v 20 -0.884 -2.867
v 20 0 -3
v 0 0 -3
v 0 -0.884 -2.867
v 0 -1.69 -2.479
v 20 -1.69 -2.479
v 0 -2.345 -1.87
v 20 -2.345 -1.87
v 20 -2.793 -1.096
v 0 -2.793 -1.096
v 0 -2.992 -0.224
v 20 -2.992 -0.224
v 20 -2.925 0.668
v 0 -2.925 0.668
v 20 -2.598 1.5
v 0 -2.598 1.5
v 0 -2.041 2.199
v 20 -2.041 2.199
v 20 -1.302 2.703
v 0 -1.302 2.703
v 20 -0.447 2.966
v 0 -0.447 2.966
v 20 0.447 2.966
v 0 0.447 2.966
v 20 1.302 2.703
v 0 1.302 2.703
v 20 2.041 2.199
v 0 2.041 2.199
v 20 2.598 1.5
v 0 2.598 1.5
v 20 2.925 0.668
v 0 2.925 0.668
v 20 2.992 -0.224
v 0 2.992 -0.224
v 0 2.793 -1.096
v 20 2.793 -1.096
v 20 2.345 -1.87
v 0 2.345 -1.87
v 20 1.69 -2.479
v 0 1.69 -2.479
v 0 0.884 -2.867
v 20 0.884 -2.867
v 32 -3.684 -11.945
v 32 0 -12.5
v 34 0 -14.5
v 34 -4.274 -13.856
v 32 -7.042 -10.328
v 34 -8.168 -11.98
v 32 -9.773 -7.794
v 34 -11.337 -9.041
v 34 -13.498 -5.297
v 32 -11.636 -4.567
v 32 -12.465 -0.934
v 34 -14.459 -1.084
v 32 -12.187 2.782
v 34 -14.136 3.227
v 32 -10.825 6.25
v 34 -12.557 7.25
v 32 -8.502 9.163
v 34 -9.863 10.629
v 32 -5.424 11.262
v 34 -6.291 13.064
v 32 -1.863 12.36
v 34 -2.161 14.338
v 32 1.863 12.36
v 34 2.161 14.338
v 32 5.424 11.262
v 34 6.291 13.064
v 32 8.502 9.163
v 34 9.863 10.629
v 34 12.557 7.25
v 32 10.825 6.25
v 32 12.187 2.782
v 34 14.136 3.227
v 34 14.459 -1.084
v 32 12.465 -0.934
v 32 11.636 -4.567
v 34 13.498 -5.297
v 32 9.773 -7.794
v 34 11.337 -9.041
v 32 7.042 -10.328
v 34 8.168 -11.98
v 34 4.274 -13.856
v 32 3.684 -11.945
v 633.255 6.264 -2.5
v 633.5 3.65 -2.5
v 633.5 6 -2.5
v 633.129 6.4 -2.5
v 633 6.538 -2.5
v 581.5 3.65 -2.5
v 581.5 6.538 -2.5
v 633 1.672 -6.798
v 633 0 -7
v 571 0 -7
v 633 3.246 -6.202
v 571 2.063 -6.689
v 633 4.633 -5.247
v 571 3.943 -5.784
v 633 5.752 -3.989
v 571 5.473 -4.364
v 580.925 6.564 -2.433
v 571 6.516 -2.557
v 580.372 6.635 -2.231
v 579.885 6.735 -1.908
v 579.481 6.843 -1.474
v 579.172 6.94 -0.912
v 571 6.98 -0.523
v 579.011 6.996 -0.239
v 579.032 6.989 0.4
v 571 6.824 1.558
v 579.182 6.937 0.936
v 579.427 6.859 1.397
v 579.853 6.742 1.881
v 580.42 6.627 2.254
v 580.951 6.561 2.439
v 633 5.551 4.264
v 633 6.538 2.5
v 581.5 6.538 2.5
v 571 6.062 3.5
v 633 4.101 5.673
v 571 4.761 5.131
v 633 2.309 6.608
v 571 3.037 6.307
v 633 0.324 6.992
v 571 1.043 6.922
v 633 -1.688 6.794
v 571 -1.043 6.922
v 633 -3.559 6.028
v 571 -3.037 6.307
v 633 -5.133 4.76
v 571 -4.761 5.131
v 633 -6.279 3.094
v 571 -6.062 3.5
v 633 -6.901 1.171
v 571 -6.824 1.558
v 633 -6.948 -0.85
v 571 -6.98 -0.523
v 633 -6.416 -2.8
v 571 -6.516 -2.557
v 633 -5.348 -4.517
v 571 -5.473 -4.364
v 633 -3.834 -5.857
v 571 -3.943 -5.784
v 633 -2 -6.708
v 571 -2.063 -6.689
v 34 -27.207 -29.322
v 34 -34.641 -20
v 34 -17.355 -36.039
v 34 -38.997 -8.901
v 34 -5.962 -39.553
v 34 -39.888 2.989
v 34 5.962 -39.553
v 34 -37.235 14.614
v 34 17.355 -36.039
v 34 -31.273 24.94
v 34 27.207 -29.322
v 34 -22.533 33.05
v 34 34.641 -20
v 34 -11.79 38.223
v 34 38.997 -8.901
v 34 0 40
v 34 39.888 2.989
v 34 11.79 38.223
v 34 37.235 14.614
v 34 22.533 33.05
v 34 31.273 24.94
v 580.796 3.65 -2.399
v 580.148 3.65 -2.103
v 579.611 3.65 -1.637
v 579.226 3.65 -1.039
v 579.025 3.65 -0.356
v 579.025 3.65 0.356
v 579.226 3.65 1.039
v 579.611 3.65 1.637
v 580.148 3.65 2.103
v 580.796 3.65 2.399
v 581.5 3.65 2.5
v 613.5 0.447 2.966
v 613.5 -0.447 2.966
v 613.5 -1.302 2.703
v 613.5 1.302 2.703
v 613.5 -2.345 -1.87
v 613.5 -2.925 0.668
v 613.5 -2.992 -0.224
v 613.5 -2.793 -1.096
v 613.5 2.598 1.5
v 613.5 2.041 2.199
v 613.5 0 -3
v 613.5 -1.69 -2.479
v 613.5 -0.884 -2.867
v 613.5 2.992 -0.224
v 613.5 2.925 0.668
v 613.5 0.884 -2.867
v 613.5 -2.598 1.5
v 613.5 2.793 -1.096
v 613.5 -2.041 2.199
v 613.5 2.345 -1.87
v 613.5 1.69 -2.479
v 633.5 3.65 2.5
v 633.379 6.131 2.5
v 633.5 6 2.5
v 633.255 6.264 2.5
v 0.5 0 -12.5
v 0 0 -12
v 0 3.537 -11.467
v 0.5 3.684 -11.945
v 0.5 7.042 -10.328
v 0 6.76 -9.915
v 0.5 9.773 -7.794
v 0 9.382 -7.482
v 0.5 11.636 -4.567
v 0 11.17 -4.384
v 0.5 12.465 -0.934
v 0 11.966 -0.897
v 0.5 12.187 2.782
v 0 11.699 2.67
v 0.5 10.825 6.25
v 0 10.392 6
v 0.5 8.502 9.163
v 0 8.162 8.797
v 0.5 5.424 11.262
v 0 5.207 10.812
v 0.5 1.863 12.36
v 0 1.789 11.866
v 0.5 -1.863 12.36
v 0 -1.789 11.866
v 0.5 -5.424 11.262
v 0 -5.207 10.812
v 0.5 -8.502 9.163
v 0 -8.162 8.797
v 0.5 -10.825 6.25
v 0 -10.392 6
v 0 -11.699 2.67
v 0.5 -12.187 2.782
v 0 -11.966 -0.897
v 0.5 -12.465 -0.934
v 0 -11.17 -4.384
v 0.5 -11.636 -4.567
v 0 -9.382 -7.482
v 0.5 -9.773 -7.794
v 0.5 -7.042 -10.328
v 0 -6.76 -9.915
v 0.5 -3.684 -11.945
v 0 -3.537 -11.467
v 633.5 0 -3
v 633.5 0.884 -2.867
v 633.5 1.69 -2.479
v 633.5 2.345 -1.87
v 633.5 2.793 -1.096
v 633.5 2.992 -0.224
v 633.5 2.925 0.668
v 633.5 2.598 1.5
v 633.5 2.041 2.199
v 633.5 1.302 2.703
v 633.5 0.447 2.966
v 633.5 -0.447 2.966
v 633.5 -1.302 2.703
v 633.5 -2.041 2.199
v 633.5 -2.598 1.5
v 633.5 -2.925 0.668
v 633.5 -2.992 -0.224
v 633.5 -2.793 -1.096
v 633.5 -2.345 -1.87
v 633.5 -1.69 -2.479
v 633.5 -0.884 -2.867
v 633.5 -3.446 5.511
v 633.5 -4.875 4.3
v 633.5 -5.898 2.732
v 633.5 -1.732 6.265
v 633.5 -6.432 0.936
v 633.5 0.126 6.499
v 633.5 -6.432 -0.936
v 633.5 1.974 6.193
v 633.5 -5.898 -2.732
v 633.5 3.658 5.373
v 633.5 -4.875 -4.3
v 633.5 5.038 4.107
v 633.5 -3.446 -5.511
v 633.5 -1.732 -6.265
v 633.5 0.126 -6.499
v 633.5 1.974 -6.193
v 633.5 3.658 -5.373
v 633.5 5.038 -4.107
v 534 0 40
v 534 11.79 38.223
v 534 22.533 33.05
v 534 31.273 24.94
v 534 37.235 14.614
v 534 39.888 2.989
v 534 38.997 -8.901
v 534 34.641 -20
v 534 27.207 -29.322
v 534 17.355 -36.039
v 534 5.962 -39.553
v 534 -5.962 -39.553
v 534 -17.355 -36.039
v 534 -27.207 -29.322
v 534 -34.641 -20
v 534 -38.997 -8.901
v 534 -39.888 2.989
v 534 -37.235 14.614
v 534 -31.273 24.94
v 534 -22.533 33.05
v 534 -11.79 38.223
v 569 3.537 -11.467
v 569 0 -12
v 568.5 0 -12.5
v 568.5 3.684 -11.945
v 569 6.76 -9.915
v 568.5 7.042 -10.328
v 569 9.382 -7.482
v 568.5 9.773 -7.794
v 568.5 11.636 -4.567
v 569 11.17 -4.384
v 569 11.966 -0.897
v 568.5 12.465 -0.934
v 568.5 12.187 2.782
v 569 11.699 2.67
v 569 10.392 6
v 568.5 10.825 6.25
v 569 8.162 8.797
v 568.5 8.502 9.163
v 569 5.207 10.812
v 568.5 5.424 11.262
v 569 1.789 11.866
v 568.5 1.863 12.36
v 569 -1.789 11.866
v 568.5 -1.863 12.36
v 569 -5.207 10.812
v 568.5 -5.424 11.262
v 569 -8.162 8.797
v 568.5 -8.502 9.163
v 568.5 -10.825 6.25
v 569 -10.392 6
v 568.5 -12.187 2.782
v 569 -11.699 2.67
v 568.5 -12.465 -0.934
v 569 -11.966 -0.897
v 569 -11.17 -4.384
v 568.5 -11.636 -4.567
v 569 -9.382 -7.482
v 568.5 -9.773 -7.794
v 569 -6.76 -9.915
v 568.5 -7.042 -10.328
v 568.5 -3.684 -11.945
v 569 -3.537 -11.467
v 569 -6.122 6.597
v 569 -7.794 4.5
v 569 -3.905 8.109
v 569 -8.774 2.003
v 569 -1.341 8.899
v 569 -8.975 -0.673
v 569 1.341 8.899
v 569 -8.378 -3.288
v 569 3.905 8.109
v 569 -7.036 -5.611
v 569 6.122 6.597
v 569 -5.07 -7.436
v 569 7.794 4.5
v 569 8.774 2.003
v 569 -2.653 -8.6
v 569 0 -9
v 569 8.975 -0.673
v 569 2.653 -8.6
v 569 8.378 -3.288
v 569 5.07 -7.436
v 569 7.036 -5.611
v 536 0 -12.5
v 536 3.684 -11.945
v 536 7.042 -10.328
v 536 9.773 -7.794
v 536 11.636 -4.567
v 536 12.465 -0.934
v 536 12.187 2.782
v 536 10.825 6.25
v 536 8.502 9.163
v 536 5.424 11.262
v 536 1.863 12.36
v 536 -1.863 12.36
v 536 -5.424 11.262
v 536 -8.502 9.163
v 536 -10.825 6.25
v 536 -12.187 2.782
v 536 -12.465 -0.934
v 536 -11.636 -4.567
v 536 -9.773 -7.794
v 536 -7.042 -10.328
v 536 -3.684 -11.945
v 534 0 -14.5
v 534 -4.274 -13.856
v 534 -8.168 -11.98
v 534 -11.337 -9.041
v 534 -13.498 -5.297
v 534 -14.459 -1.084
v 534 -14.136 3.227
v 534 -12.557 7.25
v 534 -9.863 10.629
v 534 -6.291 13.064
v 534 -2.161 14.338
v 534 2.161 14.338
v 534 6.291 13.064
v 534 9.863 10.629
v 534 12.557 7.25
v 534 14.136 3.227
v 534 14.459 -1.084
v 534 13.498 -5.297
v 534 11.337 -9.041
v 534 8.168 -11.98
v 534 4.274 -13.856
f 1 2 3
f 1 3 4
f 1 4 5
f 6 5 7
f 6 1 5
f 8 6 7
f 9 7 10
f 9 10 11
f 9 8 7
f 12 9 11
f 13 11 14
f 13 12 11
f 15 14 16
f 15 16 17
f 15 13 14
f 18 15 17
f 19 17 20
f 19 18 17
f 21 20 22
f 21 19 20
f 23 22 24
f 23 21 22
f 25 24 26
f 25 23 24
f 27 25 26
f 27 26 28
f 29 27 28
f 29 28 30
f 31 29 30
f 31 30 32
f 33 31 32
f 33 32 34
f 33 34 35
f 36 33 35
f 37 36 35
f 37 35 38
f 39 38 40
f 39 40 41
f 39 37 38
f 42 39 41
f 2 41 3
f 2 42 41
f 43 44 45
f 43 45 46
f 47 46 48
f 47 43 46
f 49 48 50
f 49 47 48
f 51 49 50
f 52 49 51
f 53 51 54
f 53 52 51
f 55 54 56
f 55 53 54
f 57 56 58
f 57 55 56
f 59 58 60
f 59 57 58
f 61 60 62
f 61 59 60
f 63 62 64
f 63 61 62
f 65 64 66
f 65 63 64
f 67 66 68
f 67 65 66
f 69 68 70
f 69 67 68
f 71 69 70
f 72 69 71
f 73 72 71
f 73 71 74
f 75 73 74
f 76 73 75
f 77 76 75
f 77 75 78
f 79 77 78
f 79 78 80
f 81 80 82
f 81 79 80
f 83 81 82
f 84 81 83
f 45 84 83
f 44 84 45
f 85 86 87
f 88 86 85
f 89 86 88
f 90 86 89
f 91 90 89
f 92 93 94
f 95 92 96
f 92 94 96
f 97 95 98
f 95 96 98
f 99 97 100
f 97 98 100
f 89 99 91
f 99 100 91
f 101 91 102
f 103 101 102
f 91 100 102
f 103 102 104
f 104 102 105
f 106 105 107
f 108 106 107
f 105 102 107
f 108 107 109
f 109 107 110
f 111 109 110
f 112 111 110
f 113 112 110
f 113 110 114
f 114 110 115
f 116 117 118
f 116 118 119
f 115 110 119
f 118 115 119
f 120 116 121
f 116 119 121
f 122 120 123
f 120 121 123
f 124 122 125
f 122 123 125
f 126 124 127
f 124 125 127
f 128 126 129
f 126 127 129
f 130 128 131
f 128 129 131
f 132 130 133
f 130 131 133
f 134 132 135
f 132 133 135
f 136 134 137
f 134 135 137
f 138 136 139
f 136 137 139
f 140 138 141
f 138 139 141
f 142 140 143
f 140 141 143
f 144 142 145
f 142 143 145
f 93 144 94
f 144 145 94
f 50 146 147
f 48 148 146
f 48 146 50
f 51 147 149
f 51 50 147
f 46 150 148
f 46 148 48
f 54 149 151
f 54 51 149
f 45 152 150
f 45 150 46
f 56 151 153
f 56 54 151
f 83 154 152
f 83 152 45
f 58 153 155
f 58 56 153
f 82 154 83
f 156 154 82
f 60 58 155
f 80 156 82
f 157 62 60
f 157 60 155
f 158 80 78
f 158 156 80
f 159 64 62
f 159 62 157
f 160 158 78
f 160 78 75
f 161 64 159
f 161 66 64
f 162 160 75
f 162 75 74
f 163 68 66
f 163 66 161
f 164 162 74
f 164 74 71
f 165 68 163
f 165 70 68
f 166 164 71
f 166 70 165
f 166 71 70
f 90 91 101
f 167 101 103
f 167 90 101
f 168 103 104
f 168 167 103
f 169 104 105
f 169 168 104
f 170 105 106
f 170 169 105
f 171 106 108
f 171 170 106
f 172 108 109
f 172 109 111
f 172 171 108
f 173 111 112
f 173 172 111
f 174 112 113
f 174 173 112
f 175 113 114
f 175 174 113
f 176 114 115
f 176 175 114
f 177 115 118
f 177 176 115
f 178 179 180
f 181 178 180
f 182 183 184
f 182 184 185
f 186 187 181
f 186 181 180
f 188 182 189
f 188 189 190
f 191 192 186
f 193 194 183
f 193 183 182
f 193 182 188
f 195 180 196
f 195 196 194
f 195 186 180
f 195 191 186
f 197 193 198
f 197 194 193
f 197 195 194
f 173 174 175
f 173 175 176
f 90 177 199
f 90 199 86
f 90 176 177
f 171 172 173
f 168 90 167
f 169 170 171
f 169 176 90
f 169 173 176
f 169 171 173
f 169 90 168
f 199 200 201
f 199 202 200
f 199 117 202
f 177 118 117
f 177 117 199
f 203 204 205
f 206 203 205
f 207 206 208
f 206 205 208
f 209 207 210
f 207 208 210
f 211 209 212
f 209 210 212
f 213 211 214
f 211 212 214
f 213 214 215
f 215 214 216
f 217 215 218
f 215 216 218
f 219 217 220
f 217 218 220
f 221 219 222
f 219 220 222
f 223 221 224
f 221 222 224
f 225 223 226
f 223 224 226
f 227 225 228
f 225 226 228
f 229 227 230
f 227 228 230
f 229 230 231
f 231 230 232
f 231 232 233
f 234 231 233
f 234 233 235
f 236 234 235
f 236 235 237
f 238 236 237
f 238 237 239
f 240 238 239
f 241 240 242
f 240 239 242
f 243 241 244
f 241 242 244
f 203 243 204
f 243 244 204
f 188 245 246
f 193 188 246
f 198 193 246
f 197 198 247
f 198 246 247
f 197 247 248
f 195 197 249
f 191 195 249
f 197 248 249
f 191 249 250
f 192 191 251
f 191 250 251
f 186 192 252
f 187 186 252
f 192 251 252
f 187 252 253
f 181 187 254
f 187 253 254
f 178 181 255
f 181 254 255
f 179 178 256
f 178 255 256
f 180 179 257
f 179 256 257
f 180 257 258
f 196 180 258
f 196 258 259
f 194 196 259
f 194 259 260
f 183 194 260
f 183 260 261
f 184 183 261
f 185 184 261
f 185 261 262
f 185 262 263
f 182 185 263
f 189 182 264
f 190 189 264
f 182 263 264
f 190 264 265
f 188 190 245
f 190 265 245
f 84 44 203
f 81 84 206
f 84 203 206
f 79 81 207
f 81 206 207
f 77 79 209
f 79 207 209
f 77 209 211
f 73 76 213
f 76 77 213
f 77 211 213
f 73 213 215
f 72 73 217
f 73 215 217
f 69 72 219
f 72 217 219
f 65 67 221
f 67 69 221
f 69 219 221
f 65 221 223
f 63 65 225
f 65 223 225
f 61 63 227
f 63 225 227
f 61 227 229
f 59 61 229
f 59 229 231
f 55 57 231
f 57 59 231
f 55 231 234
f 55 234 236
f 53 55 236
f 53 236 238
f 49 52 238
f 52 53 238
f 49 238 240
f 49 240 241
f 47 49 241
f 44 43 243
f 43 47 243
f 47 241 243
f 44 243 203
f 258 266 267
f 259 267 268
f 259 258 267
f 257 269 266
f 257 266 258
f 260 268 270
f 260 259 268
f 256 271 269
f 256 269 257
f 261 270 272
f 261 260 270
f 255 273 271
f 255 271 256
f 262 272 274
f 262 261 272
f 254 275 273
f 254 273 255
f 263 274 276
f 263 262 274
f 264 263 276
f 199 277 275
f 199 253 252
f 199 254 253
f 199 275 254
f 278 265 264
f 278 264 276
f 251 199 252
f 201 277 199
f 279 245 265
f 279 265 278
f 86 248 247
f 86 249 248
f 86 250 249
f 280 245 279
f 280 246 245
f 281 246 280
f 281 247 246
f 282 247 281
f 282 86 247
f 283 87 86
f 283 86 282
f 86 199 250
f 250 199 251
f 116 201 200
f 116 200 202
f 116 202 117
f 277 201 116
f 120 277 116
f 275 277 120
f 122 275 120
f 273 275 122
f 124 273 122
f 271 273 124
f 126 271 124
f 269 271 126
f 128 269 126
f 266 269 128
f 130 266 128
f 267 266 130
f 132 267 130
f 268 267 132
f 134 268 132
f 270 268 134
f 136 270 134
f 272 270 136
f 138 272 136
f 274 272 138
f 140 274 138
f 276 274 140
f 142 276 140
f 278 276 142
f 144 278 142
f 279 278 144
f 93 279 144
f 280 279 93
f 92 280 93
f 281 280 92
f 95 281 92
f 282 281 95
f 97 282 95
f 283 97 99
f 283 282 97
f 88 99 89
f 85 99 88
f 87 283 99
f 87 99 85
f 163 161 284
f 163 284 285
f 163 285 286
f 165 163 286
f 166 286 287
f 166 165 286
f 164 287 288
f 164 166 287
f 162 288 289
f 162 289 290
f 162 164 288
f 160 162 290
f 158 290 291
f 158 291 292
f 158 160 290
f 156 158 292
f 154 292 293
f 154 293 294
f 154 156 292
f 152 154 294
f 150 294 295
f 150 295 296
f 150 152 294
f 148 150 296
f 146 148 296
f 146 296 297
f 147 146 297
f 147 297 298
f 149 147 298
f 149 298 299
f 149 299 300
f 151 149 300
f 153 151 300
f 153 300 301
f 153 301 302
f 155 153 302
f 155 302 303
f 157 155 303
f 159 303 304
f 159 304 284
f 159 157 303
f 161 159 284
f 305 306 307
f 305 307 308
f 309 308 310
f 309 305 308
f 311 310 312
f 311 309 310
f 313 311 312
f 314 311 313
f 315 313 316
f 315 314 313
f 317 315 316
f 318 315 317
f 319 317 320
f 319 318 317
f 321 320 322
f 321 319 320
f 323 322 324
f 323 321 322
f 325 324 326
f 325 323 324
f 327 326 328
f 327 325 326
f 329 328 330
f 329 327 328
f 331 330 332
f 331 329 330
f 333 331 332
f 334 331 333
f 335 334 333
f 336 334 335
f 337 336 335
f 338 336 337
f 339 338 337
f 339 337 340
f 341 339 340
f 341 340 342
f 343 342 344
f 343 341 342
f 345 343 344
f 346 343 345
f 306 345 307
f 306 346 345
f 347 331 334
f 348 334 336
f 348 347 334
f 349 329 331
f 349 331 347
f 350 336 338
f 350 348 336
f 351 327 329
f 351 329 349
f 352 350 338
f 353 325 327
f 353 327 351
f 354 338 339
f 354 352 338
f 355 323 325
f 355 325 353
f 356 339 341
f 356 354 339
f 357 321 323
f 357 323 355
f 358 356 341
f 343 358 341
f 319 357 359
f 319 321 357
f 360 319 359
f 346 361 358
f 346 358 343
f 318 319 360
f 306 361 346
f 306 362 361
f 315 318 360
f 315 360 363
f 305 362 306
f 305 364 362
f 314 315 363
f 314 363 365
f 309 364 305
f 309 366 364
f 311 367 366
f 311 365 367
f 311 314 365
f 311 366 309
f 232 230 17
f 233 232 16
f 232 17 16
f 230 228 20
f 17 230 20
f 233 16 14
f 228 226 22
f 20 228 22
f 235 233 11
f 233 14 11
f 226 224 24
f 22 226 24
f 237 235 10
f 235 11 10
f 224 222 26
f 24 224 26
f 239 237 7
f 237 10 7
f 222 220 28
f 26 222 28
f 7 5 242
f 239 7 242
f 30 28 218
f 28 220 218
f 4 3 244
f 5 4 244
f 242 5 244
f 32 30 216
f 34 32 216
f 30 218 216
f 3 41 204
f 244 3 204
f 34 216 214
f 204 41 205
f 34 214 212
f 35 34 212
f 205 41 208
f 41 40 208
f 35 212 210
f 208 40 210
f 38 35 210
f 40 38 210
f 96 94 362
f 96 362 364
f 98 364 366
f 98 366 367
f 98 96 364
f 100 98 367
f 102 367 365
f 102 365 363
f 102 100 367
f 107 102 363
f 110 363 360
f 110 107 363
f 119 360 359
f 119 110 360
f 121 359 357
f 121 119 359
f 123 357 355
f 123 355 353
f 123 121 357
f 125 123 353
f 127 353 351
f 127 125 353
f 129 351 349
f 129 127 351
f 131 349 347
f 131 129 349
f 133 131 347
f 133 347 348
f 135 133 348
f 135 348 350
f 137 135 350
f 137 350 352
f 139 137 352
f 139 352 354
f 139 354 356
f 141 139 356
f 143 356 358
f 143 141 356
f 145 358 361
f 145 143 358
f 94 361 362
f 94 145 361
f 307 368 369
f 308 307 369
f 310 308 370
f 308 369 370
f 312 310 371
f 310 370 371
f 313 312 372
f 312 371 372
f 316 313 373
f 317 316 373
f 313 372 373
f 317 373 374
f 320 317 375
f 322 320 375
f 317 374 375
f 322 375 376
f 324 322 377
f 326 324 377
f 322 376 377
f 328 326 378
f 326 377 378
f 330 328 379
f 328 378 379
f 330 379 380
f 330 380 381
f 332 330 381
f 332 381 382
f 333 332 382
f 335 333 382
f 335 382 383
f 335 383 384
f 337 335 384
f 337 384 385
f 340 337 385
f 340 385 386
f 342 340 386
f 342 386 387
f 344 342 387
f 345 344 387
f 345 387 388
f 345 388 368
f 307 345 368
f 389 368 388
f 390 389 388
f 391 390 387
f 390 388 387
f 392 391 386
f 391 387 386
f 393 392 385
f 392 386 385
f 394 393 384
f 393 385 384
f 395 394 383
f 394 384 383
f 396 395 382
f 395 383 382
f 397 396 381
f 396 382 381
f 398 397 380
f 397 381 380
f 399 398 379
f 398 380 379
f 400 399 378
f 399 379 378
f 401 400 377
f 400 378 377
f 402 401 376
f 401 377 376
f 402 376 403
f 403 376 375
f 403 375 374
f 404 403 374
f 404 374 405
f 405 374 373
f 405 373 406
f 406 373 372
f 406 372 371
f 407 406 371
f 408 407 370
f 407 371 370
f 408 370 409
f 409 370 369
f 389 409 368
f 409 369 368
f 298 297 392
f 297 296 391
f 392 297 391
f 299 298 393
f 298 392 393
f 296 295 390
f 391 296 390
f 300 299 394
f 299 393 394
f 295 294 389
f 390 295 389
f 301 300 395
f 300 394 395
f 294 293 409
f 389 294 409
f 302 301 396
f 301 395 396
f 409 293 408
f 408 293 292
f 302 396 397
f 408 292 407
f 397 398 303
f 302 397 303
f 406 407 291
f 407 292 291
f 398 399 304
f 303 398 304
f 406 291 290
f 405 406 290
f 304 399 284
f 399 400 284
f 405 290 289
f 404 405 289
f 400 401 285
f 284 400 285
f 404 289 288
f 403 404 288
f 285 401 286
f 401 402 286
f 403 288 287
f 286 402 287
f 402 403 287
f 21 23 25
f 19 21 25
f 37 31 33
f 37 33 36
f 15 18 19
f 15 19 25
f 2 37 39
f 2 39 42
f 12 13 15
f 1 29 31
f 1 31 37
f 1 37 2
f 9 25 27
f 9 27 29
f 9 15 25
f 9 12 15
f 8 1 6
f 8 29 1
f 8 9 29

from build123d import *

# Parameters (mm, degrees)
SCHIZZO1_R               = 12.5
ESTRUSIONE1_DEPTH        = 569
SCHIZZO2_R               = 7
ESTRUSIONE2_DEPTH        = 64.5
SCHIZZO3_R               = 3
TAGLIO_ESTRUSIONE1_DEPTH = 20
TAGLIO_ESTRUSIONE2_START = -20
SCHIZZO4_R               = 3
TAGLIO_ESTRUSIONE2_DEPTH = 20
SCHIZZO5_R               = 40
ESTRUSIONE3_DEPTH        = 500
SMUSSO1_SIZE             = 2
SMUSSO2_SIZE             = 0.5
TAGLIO_ESTRUSIONE3_START = -52
TAGLIO_ESTRUSIONE3_DEPTH = 52
TAGLIO_ESTRUSIONE4_DEPTH = 10


with BuildPart() as part:
    # Schizzo1 → Estrusione1 (new body)
    with BuildSketch(Plane(origin=(0, 0, 0), x_dir=(0, 0, -1), z_dir=(1, 0, 0))):
        Circle(SCHIZZO1_R)
    extrude(amount=ESTRUSIONE1_DEPTH)

    # Schizzo2 → Estrusione2 (add)
    with BuildSketch(Plane(origin=(569, 0, 0), x_dir=(0, 0, -1), z_dir=(1, 0, 0))):
        Circle(SCHIZZO2_R)
    extrude(amount=ESTRUSIONE2_DEPTH)

    # Schizzo3 → Taglio-Estrusione1 (cut)
    with BuildSketch(Plane(origin=(633.5, 0, 0), x_dir=(0, 0, -1), z_dir=(1, 0, 0))):
        Circle(SCHIZZO3_R)
    extrude(amount=-TAGLIO_ESTRUSIONE1_DEPTH, mode=Mode.SUBTRACT)

    # Schizzo4 → Taglio-Estrusione2 (cut)
    with BuildSketch(Plane.ZY.offset(TAGLIO_ESTRUSIONE2_START)):
        with Locations(Location((0, 0, 0), (0, 0, 180))):
            Circle(SCHIZZO4_R)
    extrude(amount=TAGLIO_ESTRUSIONE2_DEPTH, mode=Mode.SUBTRACT)

    # Schizzo5 → Estrusione3 (add)
    with BuildSketch(Plane.ZY.offset(-34)):
        Circle(SCHIZZO5_R)
    extrude(amount=-ESTRUSIONE3_DEPTH)

    # Smusso1
    smusso1_edges = [part.edges().sort_by_distance(p)[0] for p in [
        (534, 0, 12.5),
        (34, 0, 12.5),
        (569, 0, 7),
    ]]
    chamfer(smusso1_edges, length=SMUSSO1_SIZE)

    # Smusso2
    smusso2_edges = [part.edges().sort_by_distance(p)[0] for p in [
        (0, 0, 12.5),
        (569, 0, 12.5),
        (633.5, 0, 7),
    ]]
    chamfer(smusso2_edges, length=SMUSSO2_SIZE)

    # Schizzo7 → Taglio-Estrusione3 (cut)
    with BuildSketch(Plane(origin=(633.5, 0, 0), x_dir=(0, 0, -1), z_dir=(1, 0, 0)).offset(TAGLIO_ESTRUSIONE3_START)):
        with BuildLine():
            Line((-2.5, 6.538348415), (-2.5, 3.65))
            Line((-2.5, 3.65), (2.5, 3.65))
            Line((2.5, 3.65), (2.5, 6.538348415))
            ThreePointArc((2.5, 6.538348415), (0, 7), (-2.5, 6.538348415))
        make_face()
    extrude(amount=TAGLIO_ESTRUSIONE3_DEPTH, mode=Mode.SUBTRACT)

    # Schizzo8 → Taglio-Estrusione4 (cut)
    with BuildSketch(Plane(origin=(0, 3.65, 0), x_dir=(1, 0, 0), z_dir=(0, 1, 0))):
        with BuildLine():
            Line((581.5, -2.5), (581.5, 2.5))
            ThreePointArc((581.5, 2.5), (579, 0), (581.5, -2.5))
        make_face()
    extrude(amount=TAGLIO_ESTRUSIONE4_DEPTH, mode=Mode.SUBTRACT)


solid = part.part
